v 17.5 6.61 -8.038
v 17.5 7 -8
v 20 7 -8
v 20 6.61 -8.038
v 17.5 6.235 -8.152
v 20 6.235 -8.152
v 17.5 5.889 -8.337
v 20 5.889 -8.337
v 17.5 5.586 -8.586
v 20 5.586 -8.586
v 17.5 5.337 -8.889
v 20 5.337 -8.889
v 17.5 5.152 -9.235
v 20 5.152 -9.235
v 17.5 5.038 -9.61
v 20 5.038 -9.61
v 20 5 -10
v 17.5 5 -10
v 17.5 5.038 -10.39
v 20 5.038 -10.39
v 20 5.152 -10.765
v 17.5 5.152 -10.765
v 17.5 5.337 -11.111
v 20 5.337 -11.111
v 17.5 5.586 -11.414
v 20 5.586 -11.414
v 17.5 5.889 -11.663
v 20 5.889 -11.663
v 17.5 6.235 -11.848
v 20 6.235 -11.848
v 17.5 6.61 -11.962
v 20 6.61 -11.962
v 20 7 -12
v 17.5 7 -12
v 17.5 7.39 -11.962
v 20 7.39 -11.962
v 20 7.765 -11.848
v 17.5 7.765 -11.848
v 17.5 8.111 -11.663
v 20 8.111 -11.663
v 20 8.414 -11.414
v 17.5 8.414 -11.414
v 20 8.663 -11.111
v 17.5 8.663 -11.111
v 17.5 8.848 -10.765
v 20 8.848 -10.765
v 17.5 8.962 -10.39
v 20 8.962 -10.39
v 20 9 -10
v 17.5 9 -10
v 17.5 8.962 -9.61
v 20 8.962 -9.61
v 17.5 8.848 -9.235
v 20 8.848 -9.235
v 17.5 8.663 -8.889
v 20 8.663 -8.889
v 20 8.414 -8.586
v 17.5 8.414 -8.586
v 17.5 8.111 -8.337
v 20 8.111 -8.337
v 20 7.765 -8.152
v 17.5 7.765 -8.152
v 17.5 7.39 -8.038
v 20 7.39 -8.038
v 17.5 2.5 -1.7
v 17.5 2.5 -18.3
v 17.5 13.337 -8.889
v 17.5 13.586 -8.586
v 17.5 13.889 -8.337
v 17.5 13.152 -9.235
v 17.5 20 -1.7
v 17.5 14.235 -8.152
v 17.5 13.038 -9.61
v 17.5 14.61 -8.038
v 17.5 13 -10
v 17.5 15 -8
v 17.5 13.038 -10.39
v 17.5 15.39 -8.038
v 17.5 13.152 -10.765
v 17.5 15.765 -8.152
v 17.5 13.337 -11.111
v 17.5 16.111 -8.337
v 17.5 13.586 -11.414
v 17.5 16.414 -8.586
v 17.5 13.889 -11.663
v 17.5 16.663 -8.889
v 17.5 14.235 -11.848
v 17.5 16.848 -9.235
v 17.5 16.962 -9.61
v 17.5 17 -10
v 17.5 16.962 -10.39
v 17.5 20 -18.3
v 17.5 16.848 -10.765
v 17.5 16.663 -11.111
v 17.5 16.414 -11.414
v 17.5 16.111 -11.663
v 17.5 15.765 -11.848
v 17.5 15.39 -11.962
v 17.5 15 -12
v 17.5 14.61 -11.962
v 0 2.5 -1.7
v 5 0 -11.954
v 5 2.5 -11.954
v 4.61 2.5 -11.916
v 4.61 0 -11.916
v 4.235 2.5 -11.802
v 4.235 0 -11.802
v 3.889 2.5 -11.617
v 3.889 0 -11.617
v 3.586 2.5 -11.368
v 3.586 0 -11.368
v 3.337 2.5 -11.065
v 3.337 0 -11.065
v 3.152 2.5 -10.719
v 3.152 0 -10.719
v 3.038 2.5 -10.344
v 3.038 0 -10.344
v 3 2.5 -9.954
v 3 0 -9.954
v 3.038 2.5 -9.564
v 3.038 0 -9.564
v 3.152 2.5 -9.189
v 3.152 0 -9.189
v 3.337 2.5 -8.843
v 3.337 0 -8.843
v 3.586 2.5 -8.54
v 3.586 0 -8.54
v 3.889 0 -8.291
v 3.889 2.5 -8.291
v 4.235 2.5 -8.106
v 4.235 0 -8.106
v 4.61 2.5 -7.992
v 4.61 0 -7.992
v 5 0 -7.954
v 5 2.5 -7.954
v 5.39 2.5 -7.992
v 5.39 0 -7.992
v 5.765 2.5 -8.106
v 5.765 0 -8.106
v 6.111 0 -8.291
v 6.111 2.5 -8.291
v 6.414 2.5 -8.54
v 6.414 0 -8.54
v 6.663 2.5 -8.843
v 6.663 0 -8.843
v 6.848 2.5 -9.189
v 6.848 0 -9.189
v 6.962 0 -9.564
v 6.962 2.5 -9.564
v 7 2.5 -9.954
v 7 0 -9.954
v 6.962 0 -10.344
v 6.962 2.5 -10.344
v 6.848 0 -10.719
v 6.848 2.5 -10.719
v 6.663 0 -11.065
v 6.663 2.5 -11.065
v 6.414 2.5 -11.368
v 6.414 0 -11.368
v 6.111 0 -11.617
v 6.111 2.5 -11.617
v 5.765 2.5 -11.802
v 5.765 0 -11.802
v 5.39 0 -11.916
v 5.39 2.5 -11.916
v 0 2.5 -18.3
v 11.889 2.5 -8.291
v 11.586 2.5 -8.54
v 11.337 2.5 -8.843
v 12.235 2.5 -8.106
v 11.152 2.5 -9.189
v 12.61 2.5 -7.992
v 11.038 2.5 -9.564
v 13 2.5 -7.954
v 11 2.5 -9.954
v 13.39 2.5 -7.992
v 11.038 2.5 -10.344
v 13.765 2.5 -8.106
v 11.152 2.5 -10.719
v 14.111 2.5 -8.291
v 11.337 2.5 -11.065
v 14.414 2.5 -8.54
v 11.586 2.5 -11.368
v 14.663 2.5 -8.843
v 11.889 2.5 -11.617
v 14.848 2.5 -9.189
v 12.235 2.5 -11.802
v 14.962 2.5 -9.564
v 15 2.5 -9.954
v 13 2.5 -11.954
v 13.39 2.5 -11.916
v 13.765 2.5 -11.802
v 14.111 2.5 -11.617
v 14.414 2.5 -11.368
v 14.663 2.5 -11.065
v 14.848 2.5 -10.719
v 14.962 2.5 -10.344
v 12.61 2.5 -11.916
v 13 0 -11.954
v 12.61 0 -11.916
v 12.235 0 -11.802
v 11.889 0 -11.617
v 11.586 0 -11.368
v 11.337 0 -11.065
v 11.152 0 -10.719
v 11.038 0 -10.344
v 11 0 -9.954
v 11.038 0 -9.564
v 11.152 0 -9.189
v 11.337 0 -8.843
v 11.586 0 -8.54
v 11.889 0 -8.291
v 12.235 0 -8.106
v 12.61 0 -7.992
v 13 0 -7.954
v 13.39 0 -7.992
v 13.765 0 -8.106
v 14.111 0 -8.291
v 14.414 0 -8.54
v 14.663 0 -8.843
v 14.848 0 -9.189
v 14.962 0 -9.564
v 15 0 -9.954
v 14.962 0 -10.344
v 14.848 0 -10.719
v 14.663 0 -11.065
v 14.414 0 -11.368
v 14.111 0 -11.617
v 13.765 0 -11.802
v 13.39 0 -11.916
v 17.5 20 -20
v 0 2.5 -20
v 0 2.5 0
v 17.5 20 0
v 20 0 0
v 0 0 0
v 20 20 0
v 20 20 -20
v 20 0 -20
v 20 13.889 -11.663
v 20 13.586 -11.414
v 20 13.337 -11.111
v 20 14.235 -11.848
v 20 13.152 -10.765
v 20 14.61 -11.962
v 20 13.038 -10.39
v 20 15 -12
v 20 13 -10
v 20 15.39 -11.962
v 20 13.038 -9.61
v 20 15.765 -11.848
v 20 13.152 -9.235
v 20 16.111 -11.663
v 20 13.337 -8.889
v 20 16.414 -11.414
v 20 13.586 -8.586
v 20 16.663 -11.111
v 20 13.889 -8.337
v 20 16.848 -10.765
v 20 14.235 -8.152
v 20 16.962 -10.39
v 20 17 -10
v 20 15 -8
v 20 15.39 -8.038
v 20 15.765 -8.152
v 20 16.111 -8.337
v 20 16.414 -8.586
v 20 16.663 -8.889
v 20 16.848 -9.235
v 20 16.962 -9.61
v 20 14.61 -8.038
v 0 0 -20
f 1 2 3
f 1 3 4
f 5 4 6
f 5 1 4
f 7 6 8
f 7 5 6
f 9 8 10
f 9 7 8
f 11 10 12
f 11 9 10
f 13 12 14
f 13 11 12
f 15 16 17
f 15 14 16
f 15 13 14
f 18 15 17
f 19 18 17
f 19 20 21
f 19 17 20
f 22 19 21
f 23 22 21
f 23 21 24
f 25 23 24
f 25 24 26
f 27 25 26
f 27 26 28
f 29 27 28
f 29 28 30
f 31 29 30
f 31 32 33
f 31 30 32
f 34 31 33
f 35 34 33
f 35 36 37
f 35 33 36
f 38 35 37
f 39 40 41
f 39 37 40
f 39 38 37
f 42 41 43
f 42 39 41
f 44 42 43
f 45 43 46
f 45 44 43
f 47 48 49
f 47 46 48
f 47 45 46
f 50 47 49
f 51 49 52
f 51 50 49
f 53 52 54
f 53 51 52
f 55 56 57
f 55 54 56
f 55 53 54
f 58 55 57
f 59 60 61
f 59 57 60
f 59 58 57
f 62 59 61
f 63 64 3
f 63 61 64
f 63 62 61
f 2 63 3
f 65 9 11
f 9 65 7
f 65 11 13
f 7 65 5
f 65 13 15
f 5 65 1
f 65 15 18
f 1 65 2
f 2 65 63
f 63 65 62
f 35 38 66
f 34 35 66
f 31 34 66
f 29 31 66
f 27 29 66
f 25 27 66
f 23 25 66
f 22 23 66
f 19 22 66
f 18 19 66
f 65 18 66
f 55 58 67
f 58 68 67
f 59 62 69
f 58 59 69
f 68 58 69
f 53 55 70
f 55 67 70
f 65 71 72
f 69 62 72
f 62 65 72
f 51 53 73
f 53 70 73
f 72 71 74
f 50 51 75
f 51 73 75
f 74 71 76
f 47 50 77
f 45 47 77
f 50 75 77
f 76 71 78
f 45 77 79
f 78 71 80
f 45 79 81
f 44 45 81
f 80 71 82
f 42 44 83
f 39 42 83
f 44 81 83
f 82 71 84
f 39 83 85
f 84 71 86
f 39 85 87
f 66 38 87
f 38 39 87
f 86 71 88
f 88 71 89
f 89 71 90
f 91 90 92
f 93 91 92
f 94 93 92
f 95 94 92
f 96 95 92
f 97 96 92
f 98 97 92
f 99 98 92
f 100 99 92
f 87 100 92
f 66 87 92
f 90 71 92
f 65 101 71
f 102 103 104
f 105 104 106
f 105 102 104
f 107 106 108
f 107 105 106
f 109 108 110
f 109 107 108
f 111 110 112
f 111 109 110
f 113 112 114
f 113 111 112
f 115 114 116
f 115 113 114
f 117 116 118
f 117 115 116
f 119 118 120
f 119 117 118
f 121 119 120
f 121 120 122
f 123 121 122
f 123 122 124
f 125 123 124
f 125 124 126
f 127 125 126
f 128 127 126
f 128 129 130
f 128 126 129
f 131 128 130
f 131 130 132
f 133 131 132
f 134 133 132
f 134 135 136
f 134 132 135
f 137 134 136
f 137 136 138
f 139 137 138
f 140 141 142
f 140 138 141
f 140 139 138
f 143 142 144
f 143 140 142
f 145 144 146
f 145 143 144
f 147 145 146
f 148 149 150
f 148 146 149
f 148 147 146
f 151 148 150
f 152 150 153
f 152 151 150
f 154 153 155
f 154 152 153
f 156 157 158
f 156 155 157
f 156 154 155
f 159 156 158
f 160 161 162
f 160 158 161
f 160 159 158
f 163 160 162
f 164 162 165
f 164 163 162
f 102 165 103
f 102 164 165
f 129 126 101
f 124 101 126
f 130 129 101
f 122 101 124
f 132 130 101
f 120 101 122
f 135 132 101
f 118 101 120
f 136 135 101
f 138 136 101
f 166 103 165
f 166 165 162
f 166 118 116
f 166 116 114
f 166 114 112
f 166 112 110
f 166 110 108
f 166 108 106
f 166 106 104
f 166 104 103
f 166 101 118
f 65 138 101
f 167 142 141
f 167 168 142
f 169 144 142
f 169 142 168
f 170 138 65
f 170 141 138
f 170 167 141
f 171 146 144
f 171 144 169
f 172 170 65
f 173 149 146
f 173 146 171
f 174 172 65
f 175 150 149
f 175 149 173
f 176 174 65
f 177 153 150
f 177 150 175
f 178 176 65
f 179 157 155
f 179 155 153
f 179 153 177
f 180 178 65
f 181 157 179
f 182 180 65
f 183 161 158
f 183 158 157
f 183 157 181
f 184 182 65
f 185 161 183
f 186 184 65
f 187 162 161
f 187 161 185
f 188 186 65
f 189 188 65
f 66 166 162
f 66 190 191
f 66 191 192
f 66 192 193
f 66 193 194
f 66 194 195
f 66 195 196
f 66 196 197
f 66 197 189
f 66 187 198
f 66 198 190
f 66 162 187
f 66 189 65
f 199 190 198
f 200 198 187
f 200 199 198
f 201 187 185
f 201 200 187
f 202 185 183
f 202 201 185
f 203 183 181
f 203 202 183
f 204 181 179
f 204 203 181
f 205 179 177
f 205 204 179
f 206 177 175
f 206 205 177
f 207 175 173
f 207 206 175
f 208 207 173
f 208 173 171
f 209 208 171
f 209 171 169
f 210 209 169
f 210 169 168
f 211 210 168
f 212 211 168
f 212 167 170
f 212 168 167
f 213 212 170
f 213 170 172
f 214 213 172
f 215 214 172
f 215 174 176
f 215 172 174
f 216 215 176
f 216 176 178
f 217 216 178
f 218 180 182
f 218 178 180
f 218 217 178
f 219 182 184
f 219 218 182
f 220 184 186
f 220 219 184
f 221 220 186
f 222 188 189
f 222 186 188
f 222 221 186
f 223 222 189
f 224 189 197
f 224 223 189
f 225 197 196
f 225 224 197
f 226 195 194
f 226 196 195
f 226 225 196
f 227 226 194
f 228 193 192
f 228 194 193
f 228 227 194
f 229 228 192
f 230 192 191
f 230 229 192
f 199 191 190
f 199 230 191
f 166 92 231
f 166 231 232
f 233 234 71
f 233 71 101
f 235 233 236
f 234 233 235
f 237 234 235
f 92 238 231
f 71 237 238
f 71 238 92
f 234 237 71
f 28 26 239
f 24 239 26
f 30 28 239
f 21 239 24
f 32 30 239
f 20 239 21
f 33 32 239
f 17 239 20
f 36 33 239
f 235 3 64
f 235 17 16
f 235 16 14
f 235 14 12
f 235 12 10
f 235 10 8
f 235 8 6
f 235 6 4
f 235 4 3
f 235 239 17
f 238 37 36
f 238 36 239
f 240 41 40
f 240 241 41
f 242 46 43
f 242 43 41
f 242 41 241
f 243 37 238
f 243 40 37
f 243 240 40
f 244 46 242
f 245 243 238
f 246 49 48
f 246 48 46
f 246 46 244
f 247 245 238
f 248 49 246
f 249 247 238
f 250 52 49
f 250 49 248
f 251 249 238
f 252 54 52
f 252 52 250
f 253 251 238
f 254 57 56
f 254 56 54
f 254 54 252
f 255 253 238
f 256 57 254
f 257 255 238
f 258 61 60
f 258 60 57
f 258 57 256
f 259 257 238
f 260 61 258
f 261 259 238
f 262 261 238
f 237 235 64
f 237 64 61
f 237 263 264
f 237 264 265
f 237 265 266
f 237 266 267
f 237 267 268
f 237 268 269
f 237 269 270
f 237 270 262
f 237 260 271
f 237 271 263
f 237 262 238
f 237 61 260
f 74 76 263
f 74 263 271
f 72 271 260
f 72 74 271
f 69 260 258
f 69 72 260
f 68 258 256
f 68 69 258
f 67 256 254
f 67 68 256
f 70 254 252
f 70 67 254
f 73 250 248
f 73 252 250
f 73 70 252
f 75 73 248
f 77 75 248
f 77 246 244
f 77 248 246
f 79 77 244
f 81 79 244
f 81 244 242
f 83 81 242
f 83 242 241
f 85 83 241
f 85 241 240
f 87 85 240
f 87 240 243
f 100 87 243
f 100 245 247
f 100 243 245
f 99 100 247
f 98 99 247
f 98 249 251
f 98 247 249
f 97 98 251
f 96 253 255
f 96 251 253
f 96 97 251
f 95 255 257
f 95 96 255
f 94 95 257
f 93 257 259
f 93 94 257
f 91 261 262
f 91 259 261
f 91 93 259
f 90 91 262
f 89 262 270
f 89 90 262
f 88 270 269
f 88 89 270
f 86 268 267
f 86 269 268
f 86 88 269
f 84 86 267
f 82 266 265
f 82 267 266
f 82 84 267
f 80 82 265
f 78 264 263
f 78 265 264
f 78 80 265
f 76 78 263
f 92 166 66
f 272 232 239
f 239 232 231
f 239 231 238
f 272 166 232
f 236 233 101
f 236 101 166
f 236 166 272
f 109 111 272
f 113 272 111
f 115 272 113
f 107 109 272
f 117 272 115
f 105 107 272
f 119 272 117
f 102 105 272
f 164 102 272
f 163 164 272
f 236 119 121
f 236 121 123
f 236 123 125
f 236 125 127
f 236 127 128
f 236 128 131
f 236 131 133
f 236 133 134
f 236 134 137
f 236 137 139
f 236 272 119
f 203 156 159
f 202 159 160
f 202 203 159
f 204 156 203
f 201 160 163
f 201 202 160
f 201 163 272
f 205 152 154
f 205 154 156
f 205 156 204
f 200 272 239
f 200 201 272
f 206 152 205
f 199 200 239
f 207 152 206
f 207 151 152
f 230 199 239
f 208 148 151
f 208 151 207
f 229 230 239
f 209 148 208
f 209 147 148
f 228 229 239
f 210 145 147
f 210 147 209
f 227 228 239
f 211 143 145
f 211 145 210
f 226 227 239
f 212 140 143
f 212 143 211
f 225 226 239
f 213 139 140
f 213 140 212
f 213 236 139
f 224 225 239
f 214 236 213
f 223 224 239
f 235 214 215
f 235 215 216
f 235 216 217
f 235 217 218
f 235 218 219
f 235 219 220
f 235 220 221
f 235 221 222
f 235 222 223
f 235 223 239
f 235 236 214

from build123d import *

# Parameters (mm, degrees)
EXTRUDE_1_DEPTH     = 20
CUT_EXTRUDE_START   = 20
SKETCH_2_W          = 17.5
SKETCH_2_H          = 16.6
CUT_EXTRUDE_1_DEPTH = 17.5
CUT_EXTRUDE_2_REACH = 36.641
SKETCH_3_R          = 2
CUT_EXTRUDE_3_REACH = 36.641
SKETCH_4_R          = 2


with BuildPart() as part:
    # 草图1 → 凸台-拉伸1 (new body)
    with BuildSketch(Plane.XY):
        Polygon((0, 0), (20, 0), (20, 20), (17.5, 20), (0, 2.5), align=None)
    extrude(amount=-EXTRUDE_1_DEPTH)

    # 草图2 → 切除-拉伸1 (cut)
    with BuildSketch(Plane(origin=(0, 0, 0), x_dir=(1, 0, 0), z_dir=(0, 1, 0)).offset(CUT_EXTRUDE_START)):
        with Locations((8.75, 10)):
            Rectangle(SKETCH_2_W, SKETCH_2_H)
    extrude(amount=-CUT_EXTRUDE_1_DEPTH, mode=Mode.SUBTRACT)

    # 草图3 → 切除-拉伸2 (cut, up to next)
    with BuildSketch(Plane(origin=(0, 0, 0), x_dir=(1, 0, 0), z_dir=(0, 1, 0)), mode=Mode.PRIVATE) as cut_extrude_2_sk1:
        with Locations(Location((5, 9.954039482, 0), (0, 0, 90))):
            Circle(SKETCH_3_R)
    cut_extrude_2_tool1 = extrude(cut_extrude_2_sk1.sketch, amount=CUT_EXTRUDE_2_REACH, mode=Mode.PRIVATE) & part.part
    # 草图3 → 切除-拉伸2 (cut, up to next)
    with BuildSketch(Plane(origin=(0, 0, 0), x_dir=(1, 0, 0), z_dir=(0, 1, 0)), mode=Mode.PRIVATE) as cut_extrude_2_sk2:
        with Locations(Location((13, 9.954039482, 0), (0, 0, 90))):
            Circle(SKETCH_3_R)
    cut_extrude_2_tool2 = extrude(cut_extrude_2_sk2.sketch, amount=CUT_EXTRUDE_2_REACH, mode=Mode.PRIVATE) & part.part
    add(cut_extrude_2_tool1.solids().sort_by_distance((5, 0, -9.954039))[0], mode=Mode.SUBTRACT)
    add(cut_extrude_2_tool2.solids().sort_by_distance((13, 0, -9.954039))[0], mode=Mode.SUBTRACT)

    # 草图4 → 切除-拉伸3 (cut, up to next)
    with BuildSketch(Plane(origin=(0, 0, 0), x_dir=(0, 0, -1), z_dir=(1, 0, 0)), mode=Mode.PRIVATE) as cut_extrude_3_sk1:
        with Locations(Location((10, 15, 0), (0, 0, 180))):
            Circle(SKETCH_4_R)
    cut_extrude_3_tool1 = extrude(cut_extrude_3_sk1.sketch, amount=CUT_EXTRUDE_3_REACH, mode=Mode.PRIVATE) & part.part
    # 草图4 → 切除-拉伸3 (cut, up to next)
    with BuildSketch(Plane(origin=(0, 0, 0), x_dir=(0, 0, -1), z_dir=(1, 0, 0)), mode=Mode.PRIVATE) as cut_extrude_3_sk2:
        with Locations(Location((10, 7, 0), (0, 0, 180))):
            Circle(SKETCH_4_R)
    cut_extrude_3_tool2 = extrude(cut_extrude_3_sk2.sketch, amount=CUT_EXTRUDE_3_REACH, mode=Mode.PRIVATE) & part.part
    add(cut_extrude_3_tool1.solids().sort_by_distance((0, 15, -10))[0], mode=Mode.SUBTRACT)
    add(cut_extrude_3_tool2.solids().sort_by_distance((0, 7, -10))[0], mode=Mode.SUBTRACT)


solid = part.part
